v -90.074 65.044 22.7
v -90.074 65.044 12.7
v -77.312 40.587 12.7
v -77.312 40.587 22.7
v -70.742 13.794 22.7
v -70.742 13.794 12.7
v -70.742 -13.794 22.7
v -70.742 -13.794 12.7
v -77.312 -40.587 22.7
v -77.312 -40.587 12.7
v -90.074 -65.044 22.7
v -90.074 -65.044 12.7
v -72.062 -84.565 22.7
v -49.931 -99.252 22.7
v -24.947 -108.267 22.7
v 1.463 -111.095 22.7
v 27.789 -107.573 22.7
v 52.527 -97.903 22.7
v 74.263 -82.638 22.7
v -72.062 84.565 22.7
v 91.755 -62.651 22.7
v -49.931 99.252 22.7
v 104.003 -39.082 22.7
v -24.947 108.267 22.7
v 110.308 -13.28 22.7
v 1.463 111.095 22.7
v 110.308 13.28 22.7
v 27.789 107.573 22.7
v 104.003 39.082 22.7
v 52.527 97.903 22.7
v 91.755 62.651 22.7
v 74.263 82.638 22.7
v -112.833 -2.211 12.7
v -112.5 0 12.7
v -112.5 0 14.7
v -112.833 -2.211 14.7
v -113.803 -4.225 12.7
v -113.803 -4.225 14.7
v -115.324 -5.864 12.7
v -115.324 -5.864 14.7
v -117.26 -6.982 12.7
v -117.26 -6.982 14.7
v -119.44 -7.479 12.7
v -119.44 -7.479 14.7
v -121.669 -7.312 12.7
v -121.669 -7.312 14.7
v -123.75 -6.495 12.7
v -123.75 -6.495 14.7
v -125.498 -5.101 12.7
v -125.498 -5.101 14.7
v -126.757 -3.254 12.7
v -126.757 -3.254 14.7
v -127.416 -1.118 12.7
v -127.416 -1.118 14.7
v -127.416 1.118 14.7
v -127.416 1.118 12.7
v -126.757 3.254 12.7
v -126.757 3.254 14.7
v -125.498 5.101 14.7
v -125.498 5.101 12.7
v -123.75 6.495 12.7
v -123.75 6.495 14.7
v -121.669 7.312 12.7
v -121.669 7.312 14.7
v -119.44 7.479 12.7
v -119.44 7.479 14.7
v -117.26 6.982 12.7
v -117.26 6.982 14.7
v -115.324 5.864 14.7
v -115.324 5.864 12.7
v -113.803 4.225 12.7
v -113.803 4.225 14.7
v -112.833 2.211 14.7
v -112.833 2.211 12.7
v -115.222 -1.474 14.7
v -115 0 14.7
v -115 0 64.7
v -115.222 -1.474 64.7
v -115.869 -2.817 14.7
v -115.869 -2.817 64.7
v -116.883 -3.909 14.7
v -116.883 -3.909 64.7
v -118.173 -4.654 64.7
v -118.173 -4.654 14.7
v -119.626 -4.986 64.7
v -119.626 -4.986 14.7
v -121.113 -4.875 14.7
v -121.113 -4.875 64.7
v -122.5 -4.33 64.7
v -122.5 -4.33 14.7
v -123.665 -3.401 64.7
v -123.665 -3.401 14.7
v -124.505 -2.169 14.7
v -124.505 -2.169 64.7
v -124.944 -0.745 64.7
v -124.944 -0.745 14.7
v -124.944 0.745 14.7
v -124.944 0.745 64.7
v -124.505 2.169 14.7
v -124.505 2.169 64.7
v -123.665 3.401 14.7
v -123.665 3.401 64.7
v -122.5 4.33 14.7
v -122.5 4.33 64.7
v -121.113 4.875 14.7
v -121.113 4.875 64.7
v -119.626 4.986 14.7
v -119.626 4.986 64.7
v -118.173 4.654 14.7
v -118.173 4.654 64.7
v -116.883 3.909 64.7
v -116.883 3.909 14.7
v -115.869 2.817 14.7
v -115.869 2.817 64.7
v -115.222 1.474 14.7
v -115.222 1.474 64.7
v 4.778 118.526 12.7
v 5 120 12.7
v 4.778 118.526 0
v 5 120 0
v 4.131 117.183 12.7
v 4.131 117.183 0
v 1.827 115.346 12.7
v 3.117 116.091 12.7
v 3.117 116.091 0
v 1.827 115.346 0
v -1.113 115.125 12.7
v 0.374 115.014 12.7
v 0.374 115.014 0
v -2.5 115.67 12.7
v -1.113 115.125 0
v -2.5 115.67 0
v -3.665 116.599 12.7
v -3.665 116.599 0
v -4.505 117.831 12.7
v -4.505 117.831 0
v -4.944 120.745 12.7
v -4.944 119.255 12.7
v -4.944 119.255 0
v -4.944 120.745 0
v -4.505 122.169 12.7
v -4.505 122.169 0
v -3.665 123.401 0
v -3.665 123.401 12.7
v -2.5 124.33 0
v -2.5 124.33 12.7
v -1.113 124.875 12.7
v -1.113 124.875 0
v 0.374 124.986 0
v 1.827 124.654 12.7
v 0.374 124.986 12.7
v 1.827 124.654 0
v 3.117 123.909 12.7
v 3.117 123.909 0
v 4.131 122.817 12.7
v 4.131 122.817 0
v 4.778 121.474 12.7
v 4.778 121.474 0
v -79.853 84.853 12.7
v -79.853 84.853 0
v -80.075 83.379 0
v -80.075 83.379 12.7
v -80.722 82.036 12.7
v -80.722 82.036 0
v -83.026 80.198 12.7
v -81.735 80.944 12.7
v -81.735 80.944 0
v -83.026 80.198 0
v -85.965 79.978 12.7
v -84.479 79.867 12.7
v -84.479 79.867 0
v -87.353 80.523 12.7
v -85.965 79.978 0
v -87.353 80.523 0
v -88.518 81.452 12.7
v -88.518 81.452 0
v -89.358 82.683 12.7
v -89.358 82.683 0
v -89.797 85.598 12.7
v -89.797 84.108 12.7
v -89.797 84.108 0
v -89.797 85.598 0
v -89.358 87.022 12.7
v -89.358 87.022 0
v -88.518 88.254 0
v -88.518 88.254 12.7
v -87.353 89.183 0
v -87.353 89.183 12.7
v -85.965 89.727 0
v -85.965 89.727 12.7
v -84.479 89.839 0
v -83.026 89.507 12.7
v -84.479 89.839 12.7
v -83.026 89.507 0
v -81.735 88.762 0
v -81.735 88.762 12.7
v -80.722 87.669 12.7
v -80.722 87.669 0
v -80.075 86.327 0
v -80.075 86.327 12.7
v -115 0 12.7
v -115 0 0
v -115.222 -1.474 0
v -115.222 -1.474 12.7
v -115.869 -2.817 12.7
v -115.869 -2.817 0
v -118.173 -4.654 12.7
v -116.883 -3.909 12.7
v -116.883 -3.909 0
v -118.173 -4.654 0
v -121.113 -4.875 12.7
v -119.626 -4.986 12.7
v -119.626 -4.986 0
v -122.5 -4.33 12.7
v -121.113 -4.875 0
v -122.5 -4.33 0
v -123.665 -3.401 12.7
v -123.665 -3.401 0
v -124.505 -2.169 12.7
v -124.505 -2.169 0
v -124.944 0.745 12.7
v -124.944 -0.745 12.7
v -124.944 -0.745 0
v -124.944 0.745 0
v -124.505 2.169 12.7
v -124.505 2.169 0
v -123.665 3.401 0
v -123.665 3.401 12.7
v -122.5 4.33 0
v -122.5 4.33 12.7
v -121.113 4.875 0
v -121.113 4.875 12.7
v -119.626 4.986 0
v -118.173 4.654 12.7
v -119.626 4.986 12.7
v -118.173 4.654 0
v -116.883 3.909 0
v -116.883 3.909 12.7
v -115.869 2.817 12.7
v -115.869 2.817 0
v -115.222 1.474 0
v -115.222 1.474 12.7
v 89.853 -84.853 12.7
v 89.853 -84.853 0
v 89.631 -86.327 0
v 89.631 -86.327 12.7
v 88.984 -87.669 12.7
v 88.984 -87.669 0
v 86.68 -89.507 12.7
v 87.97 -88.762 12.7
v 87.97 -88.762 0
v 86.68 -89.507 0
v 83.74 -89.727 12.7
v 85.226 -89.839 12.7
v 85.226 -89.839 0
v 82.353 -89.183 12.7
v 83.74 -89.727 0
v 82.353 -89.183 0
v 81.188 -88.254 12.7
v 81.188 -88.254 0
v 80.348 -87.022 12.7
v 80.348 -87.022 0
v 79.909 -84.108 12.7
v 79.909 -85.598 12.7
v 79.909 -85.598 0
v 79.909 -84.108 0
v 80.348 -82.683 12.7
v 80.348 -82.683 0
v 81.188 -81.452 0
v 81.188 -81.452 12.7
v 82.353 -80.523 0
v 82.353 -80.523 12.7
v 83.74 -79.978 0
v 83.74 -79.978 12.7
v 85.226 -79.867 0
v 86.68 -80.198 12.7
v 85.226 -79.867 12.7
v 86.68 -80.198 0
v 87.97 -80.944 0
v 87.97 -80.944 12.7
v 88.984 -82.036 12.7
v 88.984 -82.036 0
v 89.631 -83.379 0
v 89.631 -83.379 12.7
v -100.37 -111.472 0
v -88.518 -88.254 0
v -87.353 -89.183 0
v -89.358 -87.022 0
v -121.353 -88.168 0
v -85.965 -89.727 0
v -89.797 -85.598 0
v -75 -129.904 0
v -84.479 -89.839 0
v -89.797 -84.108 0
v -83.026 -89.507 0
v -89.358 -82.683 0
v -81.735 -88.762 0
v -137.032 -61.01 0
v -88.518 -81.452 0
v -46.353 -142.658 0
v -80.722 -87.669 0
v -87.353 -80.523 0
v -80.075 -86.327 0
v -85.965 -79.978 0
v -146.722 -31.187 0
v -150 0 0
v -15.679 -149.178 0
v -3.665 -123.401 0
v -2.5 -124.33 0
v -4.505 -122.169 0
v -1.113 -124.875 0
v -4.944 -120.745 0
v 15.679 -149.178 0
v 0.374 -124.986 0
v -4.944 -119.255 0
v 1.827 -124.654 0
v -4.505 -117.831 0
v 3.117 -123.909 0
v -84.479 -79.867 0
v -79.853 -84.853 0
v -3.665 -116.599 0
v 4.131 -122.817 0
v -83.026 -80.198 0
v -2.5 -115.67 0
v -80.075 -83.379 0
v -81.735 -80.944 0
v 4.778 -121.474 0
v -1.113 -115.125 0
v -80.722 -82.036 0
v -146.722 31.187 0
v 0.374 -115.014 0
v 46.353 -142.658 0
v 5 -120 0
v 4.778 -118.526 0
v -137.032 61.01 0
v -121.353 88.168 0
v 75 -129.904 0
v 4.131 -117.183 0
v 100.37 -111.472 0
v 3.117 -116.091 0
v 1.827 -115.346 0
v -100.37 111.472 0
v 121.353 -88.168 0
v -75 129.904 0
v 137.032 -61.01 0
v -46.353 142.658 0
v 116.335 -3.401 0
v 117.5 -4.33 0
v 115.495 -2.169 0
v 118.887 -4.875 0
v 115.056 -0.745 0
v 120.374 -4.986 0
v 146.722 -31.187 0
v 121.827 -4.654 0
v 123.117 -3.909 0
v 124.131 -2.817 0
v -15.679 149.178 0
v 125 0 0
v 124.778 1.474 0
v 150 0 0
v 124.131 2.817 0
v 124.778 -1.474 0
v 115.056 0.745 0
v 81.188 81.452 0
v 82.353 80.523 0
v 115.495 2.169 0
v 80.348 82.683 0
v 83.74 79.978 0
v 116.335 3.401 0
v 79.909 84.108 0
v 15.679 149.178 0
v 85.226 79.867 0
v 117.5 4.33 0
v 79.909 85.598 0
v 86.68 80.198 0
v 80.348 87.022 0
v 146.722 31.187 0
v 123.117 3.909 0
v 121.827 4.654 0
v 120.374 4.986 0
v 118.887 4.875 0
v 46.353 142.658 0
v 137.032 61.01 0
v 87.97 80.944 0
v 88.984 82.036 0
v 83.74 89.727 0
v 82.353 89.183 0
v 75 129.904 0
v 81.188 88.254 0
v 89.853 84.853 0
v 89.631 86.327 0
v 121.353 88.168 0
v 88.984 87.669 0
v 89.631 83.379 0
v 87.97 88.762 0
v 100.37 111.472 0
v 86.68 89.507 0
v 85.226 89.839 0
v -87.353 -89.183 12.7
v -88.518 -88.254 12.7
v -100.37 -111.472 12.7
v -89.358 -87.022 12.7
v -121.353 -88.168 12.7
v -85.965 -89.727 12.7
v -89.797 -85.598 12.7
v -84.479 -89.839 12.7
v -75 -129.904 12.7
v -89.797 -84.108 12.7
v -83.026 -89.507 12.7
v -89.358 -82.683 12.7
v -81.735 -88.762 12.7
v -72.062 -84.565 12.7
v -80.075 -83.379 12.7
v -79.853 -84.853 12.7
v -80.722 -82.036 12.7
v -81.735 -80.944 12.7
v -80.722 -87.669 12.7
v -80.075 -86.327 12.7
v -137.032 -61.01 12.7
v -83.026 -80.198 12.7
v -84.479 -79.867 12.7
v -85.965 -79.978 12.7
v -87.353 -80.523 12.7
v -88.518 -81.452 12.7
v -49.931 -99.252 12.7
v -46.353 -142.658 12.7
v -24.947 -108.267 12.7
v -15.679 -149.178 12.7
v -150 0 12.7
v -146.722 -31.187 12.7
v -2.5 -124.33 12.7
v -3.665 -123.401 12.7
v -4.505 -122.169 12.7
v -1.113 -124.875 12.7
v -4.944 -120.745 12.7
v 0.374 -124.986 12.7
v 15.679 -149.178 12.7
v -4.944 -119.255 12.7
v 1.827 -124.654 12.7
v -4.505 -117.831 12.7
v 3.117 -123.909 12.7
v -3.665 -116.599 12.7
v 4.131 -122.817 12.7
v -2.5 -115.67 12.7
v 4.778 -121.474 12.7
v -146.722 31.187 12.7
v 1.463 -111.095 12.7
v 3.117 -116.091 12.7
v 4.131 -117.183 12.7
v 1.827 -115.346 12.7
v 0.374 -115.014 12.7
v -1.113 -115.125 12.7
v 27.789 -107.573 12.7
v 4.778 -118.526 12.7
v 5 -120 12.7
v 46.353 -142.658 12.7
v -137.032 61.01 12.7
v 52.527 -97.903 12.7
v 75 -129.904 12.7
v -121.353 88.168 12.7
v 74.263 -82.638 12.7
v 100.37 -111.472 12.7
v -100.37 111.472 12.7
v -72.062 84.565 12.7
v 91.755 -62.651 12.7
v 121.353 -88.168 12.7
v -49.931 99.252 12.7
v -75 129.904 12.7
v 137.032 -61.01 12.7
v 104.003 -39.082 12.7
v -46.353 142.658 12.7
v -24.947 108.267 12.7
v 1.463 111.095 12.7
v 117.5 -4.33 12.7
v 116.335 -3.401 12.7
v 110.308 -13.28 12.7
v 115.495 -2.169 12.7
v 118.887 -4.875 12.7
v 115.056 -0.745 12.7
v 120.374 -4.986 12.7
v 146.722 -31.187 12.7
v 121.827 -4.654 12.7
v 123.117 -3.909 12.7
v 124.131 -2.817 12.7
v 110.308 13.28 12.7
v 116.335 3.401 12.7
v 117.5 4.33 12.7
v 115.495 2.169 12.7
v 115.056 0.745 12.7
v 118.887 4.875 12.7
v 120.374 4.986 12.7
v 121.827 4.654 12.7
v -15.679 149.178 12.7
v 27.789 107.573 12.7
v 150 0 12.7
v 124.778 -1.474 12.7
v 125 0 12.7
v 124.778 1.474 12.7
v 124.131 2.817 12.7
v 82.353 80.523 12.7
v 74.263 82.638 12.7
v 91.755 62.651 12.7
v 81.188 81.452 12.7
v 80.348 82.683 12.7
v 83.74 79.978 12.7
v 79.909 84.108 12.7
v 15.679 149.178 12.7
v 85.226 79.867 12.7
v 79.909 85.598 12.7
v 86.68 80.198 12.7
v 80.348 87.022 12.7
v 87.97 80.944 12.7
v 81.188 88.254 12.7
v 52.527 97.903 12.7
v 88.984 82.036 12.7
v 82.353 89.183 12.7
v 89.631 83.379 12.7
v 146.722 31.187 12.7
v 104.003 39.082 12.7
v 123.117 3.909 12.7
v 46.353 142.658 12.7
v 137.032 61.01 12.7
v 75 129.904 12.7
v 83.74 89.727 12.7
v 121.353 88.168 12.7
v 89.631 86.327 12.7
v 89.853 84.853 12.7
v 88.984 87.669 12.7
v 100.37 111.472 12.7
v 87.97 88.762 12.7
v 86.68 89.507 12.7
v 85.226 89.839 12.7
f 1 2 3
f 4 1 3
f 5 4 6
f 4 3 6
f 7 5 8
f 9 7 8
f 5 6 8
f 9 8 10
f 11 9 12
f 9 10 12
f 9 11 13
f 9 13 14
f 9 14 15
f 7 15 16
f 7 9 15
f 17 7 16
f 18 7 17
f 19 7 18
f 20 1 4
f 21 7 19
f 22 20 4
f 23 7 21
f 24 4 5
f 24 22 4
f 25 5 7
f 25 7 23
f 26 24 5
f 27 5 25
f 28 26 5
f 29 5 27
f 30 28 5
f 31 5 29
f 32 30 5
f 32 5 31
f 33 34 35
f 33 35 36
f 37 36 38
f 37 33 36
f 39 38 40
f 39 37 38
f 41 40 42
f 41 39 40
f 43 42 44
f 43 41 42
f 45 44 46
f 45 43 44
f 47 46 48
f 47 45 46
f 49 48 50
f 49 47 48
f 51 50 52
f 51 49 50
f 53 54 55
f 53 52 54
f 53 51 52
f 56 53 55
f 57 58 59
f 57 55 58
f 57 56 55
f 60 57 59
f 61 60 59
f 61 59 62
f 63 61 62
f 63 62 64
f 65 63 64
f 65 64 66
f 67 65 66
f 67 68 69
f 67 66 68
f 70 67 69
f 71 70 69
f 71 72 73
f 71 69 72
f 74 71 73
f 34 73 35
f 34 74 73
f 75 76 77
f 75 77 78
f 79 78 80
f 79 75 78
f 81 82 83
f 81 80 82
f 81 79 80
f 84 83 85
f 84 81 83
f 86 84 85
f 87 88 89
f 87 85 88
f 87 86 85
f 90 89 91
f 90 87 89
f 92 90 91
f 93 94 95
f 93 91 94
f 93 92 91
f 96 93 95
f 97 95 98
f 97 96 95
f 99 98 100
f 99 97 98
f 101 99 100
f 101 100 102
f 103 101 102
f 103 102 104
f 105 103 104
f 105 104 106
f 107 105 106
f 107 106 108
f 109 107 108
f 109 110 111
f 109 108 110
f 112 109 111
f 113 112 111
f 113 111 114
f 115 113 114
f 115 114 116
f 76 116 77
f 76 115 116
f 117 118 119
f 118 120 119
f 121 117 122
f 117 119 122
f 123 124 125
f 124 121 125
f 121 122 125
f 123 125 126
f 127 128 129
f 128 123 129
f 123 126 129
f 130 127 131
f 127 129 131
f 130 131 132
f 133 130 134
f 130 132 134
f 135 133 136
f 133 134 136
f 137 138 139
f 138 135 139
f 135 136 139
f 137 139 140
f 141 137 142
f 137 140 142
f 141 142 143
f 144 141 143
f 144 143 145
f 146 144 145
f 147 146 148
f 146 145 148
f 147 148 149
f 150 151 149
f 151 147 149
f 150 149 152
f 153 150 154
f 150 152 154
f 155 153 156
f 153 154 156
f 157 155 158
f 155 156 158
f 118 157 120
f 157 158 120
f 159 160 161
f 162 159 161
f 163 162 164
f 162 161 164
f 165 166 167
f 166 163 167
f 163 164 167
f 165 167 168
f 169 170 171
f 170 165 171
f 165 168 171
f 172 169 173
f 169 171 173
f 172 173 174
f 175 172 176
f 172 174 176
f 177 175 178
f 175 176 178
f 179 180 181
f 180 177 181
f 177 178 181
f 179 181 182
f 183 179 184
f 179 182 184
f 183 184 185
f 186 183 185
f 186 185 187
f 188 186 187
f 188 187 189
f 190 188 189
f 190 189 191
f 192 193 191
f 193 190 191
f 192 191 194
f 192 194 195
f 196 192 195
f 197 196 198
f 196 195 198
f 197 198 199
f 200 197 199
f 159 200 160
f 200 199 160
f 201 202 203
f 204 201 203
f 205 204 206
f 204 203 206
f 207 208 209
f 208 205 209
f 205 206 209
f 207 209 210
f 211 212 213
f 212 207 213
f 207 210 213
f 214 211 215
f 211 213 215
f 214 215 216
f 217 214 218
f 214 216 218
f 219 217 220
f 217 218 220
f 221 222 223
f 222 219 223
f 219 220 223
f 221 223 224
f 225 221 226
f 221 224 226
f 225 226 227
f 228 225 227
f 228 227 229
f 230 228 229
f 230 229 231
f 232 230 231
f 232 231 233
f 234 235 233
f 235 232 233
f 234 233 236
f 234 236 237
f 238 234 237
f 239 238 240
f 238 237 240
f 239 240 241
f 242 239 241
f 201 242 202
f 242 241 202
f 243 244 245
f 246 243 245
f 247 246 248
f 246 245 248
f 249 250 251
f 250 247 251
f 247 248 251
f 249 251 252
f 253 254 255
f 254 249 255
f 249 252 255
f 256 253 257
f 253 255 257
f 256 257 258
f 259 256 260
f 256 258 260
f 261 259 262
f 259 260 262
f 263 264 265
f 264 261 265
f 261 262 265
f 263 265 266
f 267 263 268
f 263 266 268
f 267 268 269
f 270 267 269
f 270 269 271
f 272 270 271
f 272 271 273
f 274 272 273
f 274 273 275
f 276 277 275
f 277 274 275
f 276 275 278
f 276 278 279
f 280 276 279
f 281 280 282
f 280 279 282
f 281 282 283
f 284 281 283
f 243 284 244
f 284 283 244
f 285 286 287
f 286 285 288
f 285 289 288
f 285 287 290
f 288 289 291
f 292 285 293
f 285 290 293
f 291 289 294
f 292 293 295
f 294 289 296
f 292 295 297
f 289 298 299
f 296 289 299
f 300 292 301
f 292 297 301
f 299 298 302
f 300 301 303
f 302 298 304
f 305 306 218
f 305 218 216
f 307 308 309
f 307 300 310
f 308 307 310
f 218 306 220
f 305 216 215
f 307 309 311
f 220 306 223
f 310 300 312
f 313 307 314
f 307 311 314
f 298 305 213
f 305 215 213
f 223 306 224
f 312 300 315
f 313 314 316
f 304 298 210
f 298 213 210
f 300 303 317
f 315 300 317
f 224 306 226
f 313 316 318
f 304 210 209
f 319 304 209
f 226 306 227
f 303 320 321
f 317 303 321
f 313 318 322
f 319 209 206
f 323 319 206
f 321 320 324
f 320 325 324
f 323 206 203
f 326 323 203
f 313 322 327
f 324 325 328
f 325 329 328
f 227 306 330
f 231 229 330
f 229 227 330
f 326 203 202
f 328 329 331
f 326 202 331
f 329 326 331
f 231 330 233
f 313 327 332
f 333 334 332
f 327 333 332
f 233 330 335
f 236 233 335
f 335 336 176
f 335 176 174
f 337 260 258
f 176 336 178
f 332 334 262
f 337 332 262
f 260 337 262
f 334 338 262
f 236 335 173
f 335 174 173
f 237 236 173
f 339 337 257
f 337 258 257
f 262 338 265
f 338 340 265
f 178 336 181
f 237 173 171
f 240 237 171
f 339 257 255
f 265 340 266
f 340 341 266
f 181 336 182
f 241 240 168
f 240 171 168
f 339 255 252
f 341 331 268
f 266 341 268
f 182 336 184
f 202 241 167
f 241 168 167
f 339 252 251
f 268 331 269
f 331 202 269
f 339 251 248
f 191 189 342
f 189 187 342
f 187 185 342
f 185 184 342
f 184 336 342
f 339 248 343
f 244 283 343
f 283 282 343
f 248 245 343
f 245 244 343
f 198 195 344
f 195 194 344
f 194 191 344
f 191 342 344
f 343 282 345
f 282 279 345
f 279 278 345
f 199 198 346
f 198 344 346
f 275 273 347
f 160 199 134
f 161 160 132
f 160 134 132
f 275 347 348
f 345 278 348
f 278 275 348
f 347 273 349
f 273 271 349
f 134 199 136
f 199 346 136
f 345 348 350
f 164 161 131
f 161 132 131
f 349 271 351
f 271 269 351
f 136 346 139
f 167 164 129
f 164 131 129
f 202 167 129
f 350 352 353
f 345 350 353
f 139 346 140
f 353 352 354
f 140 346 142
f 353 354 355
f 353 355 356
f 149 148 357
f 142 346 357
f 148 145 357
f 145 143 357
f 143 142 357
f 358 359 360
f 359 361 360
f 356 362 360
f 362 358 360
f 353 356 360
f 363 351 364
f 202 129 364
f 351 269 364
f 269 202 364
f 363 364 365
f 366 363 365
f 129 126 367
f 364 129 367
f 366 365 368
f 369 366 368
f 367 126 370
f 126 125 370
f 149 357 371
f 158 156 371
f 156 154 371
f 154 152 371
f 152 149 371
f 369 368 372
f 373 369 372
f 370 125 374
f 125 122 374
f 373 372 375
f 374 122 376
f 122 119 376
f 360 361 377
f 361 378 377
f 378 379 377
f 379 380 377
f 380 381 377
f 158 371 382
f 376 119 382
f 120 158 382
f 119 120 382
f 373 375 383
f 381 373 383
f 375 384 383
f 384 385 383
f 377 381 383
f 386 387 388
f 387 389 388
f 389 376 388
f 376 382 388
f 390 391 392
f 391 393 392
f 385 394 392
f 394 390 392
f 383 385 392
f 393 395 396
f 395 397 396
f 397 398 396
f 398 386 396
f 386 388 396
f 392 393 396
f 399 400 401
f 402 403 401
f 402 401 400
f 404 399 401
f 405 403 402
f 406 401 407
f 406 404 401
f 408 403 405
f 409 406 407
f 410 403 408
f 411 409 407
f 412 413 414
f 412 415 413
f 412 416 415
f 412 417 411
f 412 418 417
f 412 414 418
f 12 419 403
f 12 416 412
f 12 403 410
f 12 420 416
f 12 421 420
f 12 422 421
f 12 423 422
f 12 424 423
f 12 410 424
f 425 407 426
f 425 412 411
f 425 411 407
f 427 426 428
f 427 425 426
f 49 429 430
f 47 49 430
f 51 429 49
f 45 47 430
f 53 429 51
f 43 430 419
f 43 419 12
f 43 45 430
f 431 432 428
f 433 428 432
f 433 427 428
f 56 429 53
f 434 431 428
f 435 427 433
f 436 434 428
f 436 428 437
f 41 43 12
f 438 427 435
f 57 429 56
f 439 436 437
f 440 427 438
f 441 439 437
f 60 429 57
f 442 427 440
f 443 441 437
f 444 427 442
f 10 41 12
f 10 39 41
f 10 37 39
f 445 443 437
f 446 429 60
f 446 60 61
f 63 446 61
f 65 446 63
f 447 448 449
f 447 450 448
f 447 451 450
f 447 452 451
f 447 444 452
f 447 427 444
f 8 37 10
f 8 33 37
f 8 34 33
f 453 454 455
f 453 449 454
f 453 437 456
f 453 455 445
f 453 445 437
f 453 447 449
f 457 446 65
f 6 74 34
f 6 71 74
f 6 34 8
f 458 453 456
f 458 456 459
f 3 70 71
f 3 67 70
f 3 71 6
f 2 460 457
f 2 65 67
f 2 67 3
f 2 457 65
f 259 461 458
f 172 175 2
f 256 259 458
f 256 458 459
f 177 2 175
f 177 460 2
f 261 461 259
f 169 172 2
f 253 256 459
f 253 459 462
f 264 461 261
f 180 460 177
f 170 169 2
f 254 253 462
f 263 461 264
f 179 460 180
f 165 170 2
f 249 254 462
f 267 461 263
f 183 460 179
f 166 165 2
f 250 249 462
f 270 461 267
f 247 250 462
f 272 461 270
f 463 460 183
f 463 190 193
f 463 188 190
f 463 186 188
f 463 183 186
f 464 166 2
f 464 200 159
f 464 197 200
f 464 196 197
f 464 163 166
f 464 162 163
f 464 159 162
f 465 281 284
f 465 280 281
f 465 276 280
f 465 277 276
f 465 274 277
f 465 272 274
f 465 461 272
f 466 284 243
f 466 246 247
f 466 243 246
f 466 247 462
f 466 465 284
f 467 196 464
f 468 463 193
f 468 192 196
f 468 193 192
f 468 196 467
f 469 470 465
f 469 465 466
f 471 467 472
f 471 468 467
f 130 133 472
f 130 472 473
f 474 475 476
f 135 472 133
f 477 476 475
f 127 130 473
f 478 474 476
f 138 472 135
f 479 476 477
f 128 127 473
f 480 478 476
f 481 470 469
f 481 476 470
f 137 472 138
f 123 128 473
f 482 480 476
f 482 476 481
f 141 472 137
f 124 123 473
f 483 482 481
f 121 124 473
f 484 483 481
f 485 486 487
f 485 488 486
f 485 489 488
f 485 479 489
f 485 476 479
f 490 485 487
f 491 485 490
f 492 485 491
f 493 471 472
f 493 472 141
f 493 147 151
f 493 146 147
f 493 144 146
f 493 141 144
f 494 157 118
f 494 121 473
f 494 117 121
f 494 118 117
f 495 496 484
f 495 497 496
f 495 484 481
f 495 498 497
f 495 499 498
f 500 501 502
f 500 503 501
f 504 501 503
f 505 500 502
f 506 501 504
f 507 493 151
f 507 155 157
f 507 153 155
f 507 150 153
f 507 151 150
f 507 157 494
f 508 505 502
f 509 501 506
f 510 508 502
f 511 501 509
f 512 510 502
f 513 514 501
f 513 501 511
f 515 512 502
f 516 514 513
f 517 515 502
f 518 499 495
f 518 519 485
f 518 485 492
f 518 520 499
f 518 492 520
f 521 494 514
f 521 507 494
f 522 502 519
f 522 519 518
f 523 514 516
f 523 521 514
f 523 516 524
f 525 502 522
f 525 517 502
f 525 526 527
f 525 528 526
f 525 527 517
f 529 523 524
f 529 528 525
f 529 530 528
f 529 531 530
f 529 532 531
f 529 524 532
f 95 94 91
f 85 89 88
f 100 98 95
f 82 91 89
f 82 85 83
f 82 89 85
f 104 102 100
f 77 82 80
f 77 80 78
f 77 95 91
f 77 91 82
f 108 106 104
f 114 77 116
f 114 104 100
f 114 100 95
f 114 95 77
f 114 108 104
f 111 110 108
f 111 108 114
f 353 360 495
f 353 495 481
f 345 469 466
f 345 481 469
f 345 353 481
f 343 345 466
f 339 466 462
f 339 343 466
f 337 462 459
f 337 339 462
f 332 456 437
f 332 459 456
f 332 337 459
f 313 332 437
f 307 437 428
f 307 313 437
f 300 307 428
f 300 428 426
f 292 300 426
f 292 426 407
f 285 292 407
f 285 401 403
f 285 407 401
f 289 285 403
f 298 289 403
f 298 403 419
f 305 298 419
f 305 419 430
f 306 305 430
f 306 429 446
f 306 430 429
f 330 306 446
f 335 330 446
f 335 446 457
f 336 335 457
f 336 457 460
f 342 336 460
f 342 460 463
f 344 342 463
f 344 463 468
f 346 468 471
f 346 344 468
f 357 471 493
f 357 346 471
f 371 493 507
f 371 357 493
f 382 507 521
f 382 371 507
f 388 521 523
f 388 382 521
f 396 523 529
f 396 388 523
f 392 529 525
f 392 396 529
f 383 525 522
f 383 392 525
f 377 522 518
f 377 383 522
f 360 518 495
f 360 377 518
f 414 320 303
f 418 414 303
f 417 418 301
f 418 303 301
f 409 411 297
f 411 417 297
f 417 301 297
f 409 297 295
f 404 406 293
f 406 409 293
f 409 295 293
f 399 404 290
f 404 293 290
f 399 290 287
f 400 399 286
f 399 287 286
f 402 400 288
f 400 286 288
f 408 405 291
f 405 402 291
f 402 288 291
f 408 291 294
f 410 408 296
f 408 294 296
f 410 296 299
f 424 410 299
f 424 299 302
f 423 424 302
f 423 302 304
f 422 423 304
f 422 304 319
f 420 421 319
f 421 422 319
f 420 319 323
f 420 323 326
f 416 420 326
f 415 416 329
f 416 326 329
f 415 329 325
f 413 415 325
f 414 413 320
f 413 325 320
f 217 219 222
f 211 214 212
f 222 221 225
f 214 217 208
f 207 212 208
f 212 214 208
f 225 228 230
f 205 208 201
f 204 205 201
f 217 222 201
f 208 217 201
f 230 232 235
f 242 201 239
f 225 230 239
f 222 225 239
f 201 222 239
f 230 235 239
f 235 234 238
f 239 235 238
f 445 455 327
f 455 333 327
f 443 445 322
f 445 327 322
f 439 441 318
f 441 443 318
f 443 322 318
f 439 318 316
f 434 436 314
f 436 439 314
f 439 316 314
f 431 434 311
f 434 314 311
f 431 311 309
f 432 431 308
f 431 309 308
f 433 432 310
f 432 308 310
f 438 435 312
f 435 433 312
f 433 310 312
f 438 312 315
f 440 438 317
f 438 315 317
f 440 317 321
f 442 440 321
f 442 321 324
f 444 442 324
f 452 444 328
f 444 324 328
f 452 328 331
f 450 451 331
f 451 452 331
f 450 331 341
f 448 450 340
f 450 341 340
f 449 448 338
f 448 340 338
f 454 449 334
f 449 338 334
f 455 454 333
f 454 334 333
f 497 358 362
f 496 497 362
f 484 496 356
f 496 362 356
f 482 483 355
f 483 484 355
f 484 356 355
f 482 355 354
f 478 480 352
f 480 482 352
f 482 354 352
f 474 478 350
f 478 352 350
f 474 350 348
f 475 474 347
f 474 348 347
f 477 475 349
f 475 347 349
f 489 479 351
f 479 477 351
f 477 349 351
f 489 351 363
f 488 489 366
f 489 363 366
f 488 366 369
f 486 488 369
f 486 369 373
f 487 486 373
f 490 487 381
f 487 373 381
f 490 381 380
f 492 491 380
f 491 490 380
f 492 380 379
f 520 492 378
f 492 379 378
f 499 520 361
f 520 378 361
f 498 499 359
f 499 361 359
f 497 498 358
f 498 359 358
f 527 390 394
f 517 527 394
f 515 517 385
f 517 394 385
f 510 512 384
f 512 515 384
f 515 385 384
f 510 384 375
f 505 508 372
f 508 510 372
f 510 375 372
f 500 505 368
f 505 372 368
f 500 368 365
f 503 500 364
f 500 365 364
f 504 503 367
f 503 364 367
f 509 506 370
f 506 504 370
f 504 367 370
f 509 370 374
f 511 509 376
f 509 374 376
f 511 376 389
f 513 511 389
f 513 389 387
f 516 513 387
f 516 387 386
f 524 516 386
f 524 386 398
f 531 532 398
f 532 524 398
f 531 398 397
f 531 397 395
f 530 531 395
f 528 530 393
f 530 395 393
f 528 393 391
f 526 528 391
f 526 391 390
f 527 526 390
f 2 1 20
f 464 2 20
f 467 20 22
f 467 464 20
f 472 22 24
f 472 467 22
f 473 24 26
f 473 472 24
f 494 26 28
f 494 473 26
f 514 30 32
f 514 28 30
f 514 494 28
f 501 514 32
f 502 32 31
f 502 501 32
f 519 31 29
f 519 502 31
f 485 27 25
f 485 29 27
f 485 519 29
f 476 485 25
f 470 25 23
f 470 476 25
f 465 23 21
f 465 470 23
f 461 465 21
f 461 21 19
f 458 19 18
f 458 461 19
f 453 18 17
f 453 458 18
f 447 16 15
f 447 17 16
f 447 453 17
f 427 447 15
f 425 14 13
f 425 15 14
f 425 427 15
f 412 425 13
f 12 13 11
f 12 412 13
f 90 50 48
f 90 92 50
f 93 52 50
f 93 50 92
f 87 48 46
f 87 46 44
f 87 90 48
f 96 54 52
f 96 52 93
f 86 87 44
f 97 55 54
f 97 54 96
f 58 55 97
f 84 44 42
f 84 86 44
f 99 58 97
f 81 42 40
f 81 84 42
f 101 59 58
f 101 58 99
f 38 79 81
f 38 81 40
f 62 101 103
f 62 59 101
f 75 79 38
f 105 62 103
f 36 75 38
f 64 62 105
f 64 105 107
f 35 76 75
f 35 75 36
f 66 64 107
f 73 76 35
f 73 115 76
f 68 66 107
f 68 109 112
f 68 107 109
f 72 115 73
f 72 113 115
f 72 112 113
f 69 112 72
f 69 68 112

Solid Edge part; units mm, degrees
sketch "Sketch1" plane through (0, 0, 0) normal (0, 0, 1) x (1, 0, 0)
  circle A0 centre (-120, 0) radius 5
  circle A1 centre (84.8528, 84.8528) radius 5
  circle A2 centre (-84.8528, -84.8528) radius 5
  circle A3 centre (0, -120) radius 5
  circle A4 centre (84.8528, -84.8528) radius 5
  circle A5 centre (120, 0) radius 5
  circle A6 centre (0, 120) radius 5
  circle A7 centre (-84.8528, 84.8528) radius 5
  circle A8 centre (0, 0) radius 150
  dimension "D1" = 120
extrude "Protrusion1" add sketch "Sketch1" along normal blind 12.7
sketch "Sketch2" plane through (0, 0, 12.7) normal (0, 0, 1) x (1, 0, 0)
  arc A0 (-90.0741, -65.0445) -> (-90.0741, 65.0445) centre (0, 0) ccw
  arc A1 (-90.0741, 65.0445) -> (-90.0741, -65.0445) centre (-184.9119, 0) cw
extrude "ProtrusiónExtruida_2" add sketch "Sketch2" along normal blind 10
sketch "Sketch3" plane through (-109.956, 0, 12.7) normal (0, 0, 1) x (1, 0, 0)
  circle A0 centre (-10.044, 0) radius 7.5
extrude "ProtrusiónExtruida_3" add sketch "Sketch3" along normal blind 2
sketch "Sketch4" plane through (-120, 0, 14.7) normal (0, 0, 1) x (1, 0, 0)
  circle A0 centre (0, 0) radius 5
extrude "ProtrusiónExtruida_4" add sketch "Sketch4" along normal blind 50
